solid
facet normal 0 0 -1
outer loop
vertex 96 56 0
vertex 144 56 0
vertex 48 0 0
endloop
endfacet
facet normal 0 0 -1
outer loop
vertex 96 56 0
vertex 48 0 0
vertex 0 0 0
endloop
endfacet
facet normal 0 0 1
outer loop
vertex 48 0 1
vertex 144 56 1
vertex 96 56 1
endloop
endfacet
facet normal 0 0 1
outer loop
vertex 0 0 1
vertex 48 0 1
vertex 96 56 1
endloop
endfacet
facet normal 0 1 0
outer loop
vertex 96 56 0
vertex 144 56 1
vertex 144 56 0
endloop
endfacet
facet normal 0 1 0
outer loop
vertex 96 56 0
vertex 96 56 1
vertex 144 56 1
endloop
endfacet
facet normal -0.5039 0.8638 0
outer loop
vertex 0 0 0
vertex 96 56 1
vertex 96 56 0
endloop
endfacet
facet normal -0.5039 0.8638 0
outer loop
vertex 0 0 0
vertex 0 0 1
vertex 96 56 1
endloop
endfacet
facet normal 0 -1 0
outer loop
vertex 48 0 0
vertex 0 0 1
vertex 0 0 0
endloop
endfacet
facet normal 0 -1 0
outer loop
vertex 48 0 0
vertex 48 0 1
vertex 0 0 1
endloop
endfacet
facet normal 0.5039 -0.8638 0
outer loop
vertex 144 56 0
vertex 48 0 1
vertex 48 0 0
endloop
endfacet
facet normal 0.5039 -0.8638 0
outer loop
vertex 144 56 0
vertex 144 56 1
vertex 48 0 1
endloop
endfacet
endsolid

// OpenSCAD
// module trapezoid(base1 = 64, base2 = 48, height = 96) {
//     // Points
//     A = [-base1/2, 0];
//     B = [base1/2, 0];
//     C = [base2/2, height];
//     D = [-base2/2, height];

//     // Faces
//     polygon([A, B, C, D]);

//     // Edges
//     for (i = [0:3]) {
//         line(A[i], B[i]);
//         line(B[i], C[i]);
//         line(C[i], D[i]);
//         line(D[i], A[i]);
//     }
// }

// // Render the trapezoid
// trapezoid();


module trapezoid() {
  // Define the dimensions of the trapezoid
  a = 48; // length of AB
  b = 64; // length of CD
  h = 96; // separation between AB and CD
  d = (a + b) / 2; // average length of AB and CD

  // Define the points of the trapezoid
  A = [0, 0];
  B = [a, 0];
  C = [a + h, d];
  D = [h, d];

  // Create the trapezoid with linear_extrude
  linear_extrude(height = 1) {
    polygon(points = [A, B, C, D, A]);
  }
}

// Generate the trapezoid
trapezoid();
